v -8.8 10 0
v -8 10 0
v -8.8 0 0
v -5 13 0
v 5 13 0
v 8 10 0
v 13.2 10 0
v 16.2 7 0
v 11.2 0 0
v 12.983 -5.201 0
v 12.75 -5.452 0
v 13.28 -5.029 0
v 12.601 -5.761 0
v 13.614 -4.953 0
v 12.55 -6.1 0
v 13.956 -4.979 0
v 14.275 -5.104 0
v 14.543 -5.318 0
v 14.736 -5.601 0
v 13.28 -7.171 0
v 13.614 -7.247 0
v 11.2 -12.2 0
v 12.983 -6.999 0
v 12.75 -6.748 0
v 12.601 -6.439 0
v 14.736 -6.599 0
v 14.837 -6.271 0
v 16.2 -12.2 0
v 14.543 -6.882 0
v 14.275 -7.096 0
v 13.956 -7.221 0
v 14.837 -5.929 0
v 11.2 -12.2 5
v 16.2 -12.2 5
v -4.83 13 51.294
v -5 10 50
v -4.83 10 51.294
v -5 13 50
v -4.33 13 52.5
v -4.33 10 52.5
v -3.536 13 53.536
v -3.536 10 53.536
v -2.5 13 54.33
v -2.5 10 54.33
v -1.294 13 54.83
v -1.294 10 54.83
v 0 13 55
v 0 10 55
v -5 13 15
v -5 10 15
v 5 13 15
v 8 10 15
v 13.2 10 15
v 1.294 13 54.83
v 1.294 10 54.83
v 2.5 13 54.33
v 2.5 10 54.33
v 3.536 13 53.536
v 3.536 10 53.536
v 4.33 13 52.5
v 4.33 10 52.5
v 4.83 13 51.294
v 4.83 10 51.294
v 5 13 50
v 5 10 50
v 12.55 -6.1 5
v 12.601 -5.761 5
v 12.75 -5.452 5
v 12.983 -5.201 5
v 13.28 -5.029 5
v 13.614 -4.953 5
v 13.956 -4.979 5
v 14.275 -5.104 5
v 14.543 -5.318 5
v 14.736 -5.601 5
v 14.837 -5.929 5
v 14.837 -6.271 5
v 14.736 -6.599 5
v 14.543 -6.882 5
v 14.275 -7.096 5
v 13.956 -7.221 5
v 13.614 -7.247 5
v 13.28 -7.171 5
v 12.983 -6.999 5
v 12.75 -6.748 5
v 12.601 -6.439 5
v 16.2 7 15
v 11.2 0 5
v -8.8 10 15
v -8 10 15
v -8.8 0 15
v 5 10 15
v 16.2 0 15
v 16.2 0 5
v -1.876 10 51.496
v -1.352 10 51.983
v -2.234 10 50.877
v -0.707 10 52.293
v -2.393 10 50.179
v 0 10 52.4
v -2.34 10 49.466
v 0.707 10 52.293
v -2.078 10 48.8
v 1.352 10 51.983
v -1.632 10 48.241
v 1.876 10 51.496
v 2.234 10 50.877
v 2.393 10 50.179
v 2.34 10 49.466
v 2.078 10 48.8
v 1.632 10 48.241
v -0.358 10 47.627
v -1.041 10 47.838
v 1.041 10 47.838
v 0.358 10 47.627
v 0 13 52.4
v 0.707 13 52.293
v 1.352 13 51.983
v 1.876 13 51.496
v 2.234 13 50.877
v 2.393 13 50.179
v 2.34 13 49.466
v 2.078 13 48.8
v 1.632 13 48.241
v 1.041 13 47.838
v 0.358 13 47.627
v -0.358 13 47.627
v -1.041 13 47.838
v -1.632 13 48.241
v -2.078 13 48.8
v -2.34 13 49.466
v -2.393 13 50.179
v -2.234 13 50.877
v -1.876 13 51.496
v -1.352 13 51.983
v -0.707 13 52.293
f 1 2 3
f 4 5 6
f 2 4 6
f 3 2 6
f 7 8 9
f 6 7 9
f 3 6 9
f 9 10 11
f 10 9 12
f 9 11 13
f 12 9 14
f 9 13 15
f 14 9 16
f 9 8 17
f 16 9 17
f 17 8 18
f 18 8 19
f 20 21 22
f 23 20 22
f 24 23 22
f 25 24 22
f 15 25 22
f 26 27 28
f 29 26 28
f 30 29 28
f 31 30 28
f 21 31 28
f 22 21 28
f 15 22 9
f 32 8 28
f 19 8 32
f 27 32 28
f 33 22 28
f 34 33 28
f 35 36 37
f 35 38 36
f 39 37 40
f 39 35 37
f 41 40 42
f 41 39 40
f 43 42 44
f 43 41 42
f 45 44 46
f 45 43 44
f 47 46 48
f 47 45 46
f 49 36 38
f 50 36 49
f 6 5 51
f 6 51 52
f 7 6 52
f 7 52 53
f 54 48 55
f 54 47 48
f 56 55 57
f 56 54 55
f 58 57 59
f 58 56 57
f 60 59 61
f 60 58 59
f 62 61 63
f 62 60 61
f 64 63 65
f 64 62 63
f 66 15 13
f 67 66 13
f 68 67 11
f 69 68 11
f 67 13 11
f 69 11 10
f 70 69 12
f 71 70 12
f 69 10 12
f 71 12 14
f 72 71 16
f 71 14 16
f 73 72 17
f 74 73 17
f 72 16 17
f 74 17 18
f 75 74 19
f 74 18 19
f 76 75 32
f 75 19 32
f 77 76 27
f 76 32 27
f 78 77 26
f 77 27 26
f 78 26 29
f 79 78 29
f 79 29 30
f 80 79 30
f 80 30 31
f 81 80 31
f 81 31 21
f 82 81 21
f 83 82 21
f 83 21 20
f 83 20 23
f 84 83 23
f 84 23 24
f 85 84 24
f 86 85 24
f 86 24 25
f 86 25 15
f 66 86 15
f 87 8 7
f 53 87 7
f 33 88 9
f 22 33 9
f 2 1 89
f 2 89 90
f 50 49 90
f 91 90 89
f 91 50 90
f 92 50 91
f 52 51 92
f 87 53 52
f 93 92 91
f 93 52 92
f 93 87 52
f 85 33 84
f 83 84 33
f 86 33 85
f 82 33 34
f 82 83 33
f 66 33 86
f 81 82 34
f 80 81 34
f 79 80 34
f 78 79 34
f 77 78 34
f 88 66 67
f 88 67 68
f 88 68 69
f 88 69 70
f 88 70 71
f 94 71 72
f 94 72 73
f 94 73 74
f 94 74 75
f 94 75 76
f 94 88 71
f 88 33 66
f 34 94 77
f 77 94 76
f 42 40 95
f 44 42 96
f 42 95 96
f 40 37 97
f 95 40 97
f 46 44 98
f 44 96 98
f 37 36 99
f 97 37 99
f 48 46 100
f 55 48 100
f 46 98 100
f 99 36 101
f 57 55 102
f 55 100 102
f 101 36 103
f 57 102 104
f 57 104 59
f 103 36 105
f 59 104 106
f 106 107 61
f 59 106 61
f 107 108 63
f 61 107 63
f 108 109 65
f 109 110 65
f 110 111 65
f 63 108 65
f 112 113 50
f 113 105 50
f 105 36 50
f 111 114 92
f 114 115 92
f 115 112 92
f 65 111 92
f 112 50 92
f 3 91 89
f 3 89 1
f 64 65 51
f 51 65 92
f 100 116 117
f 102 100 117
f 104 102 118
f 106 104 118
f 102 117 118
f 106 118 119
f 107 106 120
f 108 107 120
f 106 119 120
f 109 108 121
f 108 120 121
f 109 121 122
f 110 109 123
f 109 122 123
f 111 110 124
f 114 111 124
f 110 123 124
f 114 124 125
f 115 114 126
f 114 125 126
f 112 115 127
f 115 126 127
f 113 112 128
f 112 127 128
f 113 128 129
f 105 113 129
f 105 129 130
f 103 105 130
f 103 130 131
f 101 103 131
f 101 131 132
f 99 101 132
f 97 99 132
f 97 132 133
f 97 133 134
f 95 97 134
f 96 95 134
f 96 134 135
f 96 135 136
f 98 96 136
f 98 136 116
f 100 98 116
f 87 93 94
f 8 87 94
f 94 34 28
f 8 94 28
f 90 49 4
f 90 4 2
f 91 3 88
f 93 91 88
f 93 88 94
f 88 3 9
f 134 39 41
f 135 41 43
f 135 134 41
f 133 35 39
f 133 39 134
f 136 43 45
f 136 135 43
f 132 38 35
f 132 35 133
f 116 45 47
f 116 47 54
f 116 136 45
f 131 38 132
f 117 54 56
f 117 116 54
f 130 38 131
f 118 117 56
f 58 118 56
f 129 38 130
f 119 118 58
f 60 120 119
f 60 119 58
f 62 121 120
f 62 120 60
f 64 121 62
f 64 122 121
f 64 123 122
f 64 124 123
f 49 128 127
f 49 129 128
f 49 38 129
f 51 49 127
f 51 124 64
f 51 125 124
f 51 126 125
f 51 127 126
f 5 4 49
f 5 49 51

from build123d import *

# Parameters (mm, degrees)
SKETCH1_W                    = 5
SKETCH1_H                    = 5
SERVO_MOUNT_DEPTH            = 12.2
SERVO_MOUNT_SCREW_HOLE_REACH = 22.887
SKETCH2_R                    = 1.15
SKETCH3_W                    = 25
SKETCH3_H                    = 15
SERVO_RETAINING_PLATE_DEPTH  = 10
SKETCH5_W                    = 10
SKETCH5_H                    = 55
NECK_DEPTH                   = 3
NECK_FILLET1_R               = 5
LOWER_SERVO_MOUNT_HOLE_REACH = 64.63
SKETCH6_R                    = 2.4
CHAMFER1_SIZE                = 3


# Some blends are built 0.0001 mm under size
with BuildPart() as part:
    # Sketch1 → servo mount (new body)
    with BuildSketch(Plane(origin=(0, 0, 0), x_dir=(1, 0, 0), z_dir=(0, 1, 0))):
        with Locations((13.7, -2.5)):
            Rectangle(SKETCH1_W, SKETCH1_H)
    extrude(amount=-SERVO_MOUNT_DEPTH)

    # Sketch2 → servo mount screw hole (cut, up to next)
    with BuildSketch(Plane(origin=(0, 0, 0), x_dir=(-1, 0, 0), z_dir=(0, 0, -1)), mode=Mode.PRIVATE) as servo_mount_screw_hole_sk1:
        with Locations((-13.7, -6.1)):
            Circle(SKETCH2_R)
    servo_mount_screw_hole_tool1 = extrude(servo_mount_screw_hole_sk1.sketch, amount=-SERVO_MOUNT_SCREW_HOLE_REACH, mode=Mode.PRIVATE) & part.part
    add(servo_mount_screw_hole_tool1.solids().sort_by_distance((13.7, -6.1, 0))[0], mode=Mode.SUBTRACT)

    # Sketch3 → servo retaining plate (add)
    with BuildSketch(Plane(origin=(0, 0, 0), x_dir=(1, 0, 0), z_dir=(0, 1, 0))):
        with Locations((3.7, -7.5)):
            Rectangle(SKETCH3_W, SKETCH3_H)
    extrude(amount=SERVO_RETAINING_PLATE_DEPTH)

    # Sketch5 → neck (add)
    with BuildSketch(Plane(origin=(0, 10, 0), x_dir=(1, 0, 0), z_dir=(0, 1, 0))):
        with Locations((0, -27.5)):
            Rectangle(SKETCH5_W, SKETCH5_H)
    extrude(amount=NECK_DEPTH)

    # neck fillet1
    neck_fillet1_edges = [part.edges().sort_by_distance(p)[0] for p in [
        (5, 11.5, 55),
        (-5, 11.5, 55),
    ]]
    fillet(neck_fillet1_edges, radius=NECK_FILLET1_R - 0.0001)  # a hair under: the kernel refuses the full size

    # Sketch6 → lower servo mount hole (cut, up to next)
    with BuildSketch(Plane(origin=(0, 13, 0), x_dir=(1, 0, 0), z_dir=(0, 1, 0)), mode=Mode.PRIVATE) as lower_servo_mount_hole_sk1:
        with Locations(Location((0, -50, 0), (0, 0, 270))):
            Circle(SKETCH6_R)
    lower_servo_mount_hole_tool1 = extrude(lower_servo_mount_hole_sk1.sketch, amount=-LOWER_SERVO_MOUNT_HOLE_REACH, mode=Mode.PRIVATE) & part.part
    add(lower_servo_mount_hole_tool1.solids().sort_by_distance((0, 13, 50))[0], mode=Mode.SUBTRACT)

    # Chamfer1
    # the kernel refuses this chamfer: 3 mm, written as the material it adds along each edge
    with BuildSketch(Plane(origin=(-5, 10, 15), x_dir=(0.027495876610586494, 0.9996219169112968, 0), z_dir=(0, 0, -1)), Plane(origin=(5, 10, 0), x_dir=(-0.027495876610586494, 0.9996219169112968, 0), z_dir=(0, 0, 1))) as chamfer1_piece_1:
        Polygon((CHAMFER1_SIZE * 0.999621916911, -CHAMFER1_SIZE * 0.0274958766106), (-CHAMFER1_SIZE * 0.0274958766106, -CHAMFER1_SIZE * 0.999621916911), (0, 0), align=None)
    extrude(amount=15)
    # the kernel refuses this chamfer: 3 mm, written as the material it takes off along each edge
    with BuildSketch(Plane(origin=(16.2, 10, 22.715048964), x_dir=(0.027495876610586775, -0.9996219169112968, 0), z_dir=(0, 0, -1))) as chamfer1_2_piece_1:
        Polygon((CHAMFER1_SIZE * 0.999621916911, CHAMFER1_SIZE * 0.0274958766106), (-CHAMFER1_SIZE * 0.0274958766106, CHAMFER1_SIZE * 0.999621916911), (0, 0), align=None)
    extrude(amount=30.430097928, mode=Mode.SUBTRACT)


solid = part.part
